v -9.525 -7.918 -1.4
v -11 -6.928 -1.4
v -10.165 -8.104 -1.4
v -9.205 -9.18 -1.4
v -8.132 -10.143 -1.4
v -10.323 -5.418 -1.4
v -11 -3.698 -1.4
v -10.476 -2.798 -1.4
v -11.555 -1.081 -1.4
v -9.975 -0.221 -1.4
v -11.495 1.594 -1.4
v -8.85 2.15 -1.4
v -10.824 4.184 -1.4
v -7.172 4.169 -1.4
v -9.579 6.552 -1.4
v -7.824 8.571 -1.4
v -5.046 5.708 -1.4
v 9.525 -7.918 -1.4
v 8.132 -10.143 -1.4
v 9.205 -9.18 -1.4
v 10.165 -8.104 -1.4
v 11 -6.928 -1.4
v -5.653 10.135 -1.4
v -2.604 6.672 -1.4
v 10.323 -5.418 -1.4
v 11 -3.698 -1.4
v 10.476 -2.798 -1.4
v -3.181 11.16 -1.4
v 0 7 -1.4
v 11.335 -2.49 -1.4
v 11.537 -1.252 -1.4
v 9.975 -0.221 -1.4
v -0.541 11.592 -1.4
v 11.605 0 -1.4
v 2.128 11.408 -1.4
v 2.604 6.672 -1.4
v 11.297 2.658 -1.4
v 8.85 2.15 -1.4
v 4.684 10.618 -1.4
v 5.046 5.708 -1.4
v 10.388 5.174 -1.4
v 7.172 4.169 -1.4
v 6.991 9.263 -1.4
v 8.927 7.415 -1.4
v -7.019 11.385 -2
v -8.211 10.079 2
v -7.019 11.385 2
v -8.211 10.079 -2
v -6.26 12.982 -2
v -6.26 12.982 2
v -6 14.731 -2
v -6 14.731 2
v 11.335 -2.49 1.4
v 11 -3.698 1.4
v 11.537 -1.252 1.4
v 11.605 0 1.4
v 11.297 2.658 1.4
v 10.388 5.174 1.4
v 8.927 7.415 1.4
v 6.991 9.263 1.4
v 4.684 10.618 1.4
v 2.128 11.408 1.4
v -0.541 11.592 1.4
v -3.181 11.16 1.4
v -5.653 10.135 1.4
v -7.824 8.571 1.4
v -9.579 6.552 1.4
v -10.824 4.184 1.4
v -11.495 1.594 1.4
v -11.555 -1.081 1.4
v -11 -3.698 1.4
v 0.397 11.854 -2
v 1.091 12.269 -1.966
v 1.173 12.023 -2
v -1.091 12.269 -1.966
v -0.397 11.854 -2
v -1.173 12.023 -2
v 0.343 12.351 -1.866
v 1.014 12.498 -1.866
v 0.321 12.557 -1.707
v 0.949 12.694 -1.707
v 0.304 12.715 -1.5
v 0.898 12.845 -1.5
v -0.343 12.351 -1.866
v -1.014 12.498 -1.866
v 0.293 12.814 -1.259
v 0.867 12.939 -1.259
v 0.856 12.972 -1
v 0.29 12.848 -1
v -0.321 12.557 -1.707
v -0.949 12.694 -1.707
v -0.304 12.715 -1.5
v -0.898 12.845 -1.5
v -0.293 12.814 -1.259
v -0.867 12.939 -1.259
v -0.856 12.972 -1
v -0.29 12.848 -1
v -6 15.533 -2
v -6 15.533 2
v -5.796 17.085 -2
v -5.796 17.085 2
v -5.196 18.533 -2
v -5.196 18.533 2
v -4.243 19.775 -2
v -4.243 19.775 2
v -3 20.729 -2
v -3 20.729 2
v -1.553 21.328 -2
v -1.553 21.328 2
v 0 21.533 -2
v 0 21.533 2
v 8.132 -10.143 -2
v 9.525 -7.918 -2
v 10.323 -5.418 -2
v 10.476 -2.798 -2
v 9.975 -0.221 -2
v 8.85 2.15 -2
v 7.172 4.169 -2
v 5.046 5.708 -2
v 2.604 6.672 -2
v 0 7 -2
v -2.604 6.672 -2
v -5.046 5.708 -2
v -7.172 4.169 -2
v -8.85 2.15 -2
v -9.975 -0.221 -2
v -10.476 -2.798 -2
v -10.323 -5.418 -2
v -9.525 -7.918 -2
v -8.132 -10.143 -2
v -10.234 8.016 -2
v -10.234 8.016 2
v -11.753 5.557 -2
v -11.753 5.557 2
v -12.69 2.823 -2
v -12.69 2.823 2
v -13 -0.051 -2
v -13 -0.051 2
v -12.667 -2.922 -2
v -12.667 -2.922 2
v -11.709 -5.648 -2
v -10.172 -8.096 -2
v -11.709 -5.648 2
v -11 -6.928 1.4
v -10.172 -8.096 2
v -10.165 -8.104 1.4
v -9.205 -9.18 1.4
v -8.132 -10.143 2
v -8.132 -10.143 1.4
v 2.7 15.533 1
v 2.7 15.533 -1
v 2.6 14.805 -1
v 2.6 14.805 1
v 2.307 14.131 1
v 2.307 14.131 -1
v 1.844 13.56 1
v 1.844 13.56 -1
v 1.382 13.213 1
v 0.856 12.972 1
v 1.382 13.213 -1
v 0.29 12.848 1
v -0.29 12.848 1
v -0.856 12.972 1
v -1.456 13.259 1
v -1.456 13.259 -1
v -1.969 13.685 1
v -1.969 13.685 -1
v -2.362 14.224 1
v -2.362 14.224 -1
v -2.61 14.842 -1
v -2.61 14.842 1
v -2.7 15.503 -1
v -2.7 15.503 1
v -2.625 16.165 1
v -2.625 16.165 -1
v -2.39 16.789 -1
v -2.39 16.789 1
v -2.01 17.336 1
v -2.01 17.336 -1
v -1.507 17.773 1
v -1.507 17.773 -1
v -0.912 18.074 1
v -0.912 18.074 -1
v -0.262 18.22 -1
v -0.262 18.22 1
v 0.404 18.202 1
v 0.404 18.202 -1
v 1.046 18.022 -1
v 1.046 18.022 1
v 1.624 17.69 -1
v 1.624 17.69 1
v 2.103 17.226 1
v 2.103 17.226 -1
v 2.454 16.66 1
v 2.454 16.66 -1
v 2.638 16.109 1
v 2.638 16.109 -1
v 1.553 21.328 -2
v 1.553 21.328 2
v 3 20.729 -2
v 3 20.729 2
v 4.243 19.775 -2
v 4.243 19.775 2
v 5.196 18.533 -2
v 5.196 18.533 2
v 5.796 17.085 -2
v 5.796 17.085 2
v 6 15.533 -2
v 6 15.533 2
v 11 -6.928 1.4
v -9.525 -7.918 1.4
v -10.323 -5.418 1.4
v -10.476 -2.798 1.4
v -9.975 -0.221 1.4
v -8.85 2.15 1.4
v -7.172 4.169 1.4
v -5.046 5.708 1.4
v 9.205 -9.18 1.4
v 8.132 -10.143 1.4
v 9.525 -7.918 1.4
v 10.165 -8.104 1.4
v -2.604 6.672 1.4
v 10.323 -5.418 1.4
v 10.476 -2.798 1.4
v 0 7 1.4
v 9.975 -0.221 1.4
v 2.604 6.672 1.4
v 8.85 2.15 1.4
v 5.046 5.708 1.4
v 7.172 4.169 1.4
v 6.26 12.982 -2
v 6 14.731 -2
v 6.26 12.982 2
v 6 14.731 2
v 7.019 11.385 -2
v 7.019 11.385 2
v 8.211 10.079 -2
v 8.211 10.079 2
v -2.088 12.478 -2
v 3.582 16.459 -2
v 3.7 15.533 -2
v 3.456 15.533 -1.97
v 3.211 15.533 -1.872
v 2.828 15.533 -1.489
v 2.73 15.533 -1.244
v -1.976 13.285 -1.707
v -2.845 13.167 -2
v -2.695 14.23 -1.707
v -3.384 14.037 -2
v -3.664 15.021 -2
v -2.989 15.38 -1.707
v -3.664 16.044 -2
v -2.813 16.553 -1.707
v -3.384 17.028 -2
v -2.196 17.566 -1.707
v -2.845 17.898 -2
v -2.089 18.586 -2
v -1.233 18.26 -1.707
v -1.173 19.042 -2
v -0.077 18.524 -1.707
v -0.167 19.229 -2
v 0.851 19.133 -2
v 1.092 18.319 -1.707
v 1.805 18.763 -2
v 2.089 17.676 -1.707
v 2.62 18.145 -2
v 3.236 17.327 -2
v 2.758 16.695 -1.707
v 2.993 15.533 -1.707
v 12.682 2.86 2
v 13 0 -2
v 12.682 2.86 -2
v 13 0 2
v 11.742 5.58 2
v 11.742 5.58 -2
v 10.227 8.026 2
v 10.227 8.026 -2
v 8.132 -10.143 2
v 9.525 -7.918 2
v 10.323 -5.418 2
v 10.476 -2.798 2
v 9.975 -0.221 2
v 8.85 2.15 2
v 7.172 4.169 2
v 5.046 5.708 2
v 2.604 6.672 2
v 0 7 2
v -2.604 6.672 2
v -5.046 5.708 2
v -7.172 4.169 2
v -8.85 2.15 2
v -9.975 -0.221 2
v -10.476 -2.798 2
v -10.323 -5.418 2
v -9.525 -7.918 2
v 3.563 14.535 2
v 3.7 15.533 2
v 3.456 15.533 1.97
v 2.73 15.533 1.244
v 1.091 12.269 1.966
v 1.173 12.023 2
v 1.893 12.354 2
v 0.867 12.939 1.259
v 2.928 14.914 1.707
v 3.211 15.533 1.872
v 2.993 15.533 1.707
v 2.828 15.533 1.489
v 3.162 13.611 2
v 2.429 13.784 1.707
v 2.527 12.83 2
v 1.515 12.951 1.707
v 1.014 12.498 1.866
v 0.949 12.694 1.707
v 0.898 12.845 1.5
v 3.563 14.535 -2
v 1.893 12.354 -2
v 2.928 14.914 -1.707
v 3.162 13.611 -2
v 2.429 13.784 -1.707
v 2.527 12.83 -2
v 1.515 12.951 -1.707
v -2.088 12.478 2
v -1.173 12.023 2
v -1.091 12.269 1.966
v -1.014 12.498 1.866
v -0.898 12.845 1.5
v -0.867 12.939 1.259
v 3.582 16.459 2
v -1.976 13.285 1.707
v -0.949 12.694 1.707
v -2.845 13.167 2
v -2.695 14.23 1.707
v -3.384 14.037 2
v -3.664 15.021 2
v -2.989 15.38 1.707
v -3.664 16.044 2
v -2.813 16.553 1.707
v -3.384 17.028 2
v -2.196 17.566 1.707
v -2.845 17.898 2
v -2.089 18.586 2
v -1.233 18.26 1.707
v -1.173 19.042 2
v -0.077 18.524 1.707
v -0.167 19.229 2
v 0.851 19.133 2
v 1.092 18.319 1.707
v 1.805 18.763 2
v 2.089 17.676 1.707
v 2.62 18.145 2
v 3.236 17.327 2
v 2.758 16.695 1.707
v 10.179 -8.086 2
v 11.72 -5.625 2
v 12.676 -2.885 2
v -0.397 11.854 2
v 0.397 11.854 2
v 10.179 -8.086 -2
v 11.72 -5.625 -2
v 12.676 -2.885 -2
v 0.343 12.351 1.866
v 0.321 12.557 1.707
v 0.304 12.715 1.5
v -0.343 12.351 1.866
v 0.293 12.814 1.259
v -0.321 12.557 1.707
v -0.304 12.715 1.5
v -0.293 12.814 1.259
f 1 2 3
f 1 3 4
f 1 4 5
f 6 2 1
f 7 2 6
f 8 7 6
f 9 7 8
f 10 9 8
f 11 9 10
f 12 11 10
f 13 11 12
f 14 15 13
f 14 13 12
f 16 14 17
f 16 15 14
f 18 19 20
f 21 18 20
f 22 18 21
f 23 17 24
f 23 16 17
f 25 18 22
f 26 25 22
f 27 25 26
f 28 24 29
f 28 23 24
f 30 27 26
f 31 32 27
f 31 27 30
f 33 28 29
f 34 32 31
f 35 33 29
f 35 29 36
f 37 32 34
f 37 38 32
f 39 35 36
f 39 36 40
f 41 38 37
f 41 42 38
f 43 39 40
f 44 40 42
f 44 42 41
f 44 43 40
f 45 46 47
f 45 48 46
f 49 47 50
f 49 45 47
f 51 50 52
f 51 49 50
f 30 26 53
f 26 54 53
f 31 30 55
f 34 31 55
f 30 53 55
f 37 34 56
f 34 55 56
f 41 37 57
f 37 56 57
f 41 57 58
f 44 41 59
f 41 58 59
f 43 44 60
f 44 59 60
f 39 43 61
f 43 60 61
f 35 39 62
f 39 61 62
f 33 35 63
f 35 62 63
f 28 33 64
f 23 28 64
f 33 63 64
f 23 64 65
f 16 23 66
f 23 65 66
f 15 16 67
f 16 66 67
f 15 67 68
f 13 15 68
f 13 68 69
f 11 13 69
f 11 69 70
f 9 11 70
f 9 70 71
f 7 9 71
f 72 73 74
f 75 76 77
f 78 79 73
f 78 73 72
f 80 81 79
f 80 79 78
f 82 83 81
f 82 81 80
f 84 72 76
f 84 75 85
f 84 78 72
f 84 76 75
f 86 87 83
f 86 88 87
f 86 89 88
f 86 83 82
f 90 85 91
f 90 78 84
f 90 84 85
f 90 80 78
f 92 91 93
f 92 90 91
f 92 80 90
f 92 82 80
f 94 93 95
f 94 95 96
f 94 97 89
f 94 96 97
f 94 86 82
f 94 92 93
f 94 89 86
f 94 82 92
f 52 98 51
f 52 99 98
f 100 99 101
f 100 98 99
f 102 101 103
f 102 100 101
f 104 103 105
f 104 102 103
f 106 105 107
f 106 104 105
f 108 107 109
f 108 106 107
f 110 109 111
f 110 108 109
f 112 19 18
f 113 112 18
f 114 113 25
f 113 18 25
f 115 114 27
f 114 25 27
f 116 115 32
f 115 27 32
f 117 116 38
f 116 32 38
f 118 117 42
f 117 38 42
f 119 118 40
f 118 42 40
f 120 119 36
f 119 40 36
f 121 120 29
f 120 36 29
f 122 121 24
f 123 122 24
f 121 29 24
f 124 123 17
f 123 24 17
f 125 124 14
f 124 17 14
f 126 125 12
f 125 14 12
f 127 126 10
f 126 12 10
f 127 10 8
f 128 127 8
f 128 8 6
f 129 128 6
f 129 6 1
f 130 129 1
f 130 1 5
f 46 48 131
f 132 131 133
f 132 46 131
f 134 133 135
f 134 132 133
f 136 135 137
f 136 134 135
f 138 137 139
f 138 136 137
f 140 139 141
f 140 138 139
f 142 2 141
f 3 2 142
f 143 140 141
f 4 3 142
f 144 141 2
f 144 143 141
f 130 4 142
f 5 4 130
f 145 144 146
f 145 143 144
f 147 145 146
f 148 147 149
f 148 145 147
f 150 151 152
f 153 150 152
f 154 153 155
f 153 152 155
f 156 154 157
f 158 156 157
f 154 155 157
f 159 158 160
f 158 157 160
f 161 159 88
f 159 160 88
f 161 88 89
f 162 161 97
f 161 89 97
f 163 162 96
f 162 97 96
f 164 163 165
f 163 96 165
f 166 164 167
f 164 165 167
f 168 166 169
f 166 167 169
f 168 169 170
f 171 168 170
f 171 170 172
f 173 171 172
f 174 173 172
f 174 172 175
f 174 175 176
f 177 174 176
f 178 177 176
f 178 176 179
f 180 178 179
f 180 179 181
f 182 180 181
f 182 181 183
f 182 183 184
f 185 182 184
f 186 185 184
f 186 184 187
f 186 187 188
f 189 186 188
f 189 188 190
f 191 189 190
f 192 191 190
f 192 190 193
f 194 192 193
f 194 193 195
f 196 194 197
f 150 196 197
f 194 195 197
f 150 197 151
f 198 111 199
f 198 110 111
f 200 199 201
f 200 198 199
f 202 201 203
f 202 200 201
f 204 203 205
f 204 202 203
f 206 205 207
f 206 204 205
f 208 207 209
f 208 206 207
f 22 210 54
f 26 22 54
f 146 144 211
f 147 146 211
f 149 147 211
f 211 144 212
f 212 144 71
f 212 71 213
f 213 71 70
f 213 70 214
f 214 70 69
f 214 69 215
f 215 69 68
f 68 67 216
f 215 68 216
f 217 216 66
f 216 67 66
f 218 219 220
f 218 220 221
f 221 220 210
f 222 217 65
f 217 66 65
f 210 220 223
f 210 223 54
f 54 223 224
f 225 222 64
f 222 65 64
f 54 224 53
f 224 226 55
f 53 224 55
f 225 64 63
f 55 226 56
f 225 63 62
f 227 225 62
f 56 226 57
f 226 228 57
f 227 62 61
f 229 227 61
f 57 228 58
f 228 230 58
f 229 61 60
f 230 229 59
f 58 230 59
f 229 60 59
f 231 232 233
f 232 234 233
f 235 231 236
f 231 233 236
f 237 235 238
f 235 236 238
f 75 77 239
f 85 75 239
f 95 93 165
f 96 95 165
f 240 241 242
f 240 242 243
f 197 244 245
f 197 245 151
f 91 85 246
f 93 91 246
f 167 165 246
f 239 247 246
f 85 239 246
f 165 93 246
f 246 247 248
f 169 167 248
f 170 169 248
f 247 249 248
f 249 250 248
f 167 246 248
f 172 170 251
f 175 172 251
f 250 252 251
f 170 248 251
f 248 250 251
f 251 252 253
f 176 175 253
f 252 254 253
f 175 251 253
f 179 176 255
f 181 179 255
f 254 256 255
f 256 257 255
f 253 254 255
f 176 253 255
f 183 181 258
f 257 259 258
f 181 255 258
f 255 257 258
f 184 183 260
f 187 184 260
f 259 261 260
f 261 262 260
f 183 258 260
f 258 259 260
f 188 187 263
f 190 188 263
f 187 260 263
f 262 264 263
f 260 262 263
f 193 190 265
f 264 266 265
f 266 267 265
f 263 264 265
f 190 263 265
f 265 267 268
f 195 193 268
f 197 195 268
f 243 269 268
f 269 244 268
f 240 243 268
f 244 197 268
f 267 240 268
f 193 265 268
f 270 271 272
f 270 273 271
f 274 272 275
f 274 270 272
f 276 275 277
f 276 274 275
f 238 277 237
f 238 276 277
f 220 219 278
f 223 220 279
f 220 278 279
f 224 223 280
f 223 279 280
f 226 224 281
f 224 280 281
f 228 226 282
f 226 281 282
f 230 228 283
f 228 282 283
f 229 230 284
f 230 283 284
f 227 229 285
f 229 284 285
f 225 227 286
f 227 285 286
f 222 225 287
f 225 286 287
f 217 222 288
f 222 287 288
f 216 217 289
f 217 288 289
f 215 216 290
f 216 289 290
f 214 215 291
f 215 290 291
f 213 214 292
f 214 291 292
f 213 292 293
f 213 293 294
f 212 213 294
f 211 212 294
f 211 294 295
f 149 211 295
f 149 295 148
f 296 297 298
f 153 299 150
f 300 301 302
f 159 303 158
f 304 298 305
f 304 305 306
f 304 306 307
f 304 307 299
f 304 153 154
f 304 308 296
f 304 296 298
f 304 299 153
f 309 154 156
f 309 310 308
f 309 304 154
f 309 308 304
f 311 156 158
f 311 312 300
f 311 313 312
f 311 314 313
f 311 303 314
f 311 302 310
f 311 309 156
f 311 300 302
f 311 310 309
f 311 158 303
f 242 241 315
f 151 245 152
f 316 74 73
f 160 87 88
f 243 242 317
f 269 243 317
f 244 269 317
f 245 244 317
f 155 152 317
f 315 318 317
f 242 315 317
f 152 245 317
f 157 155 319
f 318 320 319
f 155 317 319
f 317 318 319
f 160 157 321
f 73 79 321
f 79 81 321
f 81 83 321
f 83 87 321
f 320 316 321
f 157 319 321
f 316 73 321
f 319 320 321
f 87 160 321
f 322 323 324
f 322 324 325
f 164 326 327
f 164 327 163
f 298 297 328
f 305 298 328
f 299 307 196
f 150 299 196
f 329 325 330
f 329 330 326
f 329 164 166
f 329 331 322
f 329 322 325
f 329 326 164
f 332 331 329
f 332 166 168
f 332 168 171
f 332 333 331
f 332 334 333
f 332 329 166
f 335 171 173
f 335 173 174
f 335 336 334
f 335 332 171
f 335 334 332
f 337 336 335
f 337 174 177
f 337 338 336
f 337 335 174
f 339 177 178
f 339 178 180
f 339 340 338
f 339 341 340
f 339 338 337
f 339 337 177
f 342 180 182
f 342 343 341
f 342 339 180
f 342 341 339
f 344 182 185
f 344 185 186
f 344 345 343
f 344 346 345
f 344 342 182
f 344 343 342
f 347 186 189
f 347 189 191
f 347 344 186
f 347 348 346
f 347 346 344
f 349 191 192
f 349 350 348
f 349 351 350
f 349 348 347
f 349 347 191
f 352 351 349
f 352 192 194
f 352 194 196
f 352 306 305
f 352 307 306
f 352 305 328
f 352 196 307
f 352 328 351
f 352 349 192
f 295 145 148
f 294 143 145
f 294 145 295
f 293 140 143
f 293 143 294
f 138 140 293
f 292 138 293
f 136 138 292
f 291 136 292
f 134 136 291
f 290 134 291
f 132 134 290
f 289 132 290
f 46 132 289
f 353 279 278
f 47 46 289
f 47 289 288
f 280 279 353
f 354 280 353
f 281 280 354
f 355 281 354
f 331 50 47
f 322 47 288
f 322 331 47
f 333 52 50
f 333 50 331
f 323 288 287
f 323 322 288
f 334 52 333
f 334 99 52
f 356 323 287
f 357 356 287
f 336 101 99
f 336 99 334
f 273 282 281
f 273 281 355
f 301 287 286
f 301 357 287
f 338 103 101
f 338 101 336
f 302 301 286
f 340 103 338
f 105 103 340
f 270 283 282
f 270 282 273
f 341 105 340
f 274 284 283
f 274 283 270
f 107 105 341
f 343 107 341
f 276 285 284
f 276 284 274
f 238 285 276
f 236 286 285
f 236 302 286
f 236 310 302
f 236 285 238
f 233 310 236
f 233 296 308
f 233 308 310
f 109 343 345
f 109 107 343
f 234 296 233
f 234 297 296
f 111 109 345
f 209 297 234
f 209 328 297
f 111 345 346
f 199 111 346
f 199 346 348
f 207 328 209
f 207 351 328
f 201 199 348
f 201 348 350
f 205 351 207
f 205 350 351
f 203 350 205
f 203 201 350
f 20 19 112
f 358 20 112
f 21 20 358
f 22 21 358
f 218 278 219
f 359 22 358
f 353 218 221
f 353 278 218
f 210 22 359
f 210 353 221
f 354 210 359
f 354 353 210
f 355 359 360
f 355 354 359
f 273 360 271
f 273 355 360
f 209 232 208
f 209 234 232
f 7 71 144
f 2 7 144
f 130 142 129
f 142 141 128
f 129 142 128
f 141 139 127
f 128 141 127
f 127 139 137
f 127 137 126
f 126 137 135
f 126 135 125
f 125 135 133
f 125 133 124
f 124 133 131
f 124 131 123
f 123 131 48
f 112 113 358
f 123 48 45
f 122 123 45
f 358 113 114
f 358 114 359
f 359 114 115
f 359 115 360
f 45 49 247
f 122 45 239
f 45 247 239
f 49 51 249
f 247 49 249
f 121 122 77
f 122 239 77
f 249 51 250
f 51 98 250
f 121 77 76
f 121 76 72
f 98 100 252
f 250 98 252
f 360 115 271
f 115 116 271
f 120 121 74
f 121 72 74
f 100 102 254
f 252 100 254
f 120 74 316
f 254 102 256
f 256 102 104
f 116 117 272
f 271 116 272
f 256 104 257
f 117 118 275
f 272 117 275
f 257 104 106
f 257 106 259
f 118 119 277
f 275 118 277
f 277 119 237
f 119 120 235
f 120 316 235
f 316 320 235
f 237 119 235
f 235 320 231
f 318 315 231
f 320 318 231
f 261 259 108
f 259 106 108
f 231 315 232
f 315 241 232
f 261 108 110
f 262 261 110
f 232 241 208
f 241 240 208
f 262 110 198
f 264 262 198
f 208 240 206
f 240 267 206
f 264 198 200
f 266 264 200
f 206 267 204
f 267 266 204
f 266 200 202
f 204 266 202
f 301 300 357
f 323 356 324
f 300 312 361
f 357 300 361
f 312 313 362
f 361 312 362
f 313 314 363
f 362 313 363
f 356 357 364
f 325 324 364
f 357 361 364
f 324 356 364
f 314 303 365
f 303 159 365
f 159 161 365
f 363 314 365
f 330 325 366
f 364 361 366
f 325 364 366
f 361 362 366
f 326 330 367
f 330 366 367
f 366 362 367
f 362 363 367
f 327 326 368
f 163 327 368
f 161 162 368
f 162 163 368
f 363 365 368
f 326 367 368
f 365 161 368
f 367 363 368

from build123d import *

# Parameters (mm, degrees)
F1_DEPTH = 2
F2_R     = 5.99999
F3_R     = 1
F4_R     = 10.5
F5_DEPTH = 4.001
F7_DEPTH = 1.4


# Not quite as in the source:
# - a fillet or chamfer is up to 0.001 mm smaller than in the source, because OpenCascade refuses the exact size


with BuildPart() as f1:
    # F0 (on Top) → F1 (new body, symmetric)
    with BuildSketch(Plane.XY):
        with BuildLine():
            ThreePointArc((-6, 11.5325625947), (-6.7453687816, -11.1130553854), (13, 0))
            ThreePointArc((13, 0), (11.1130553854, 6.7453687816), (6, 11.5325625947))
            Line((6, 11.5325625947), (-6, 11.5325625947))
        make_face()
        with BuildLine():
            Line((-6, 11.5325625947), (6, 11.5325625947))
            ThreePointArc((6, 11.5325625947), (3.5026447844, 12.5192443667), (0.8558504936, 12.9717970973))
            ThreePointArc((0.8558504936, 12.9717970973), (0, 12.8325625947), (-0.8558504936, 12.9717970973))
            ThreePointArc((-0.8558504936, 12.9717970973), (-3.5026447844, 12.5192443667), (-6, 11.5325625947))
        make_face()
        with BuildLine():
            ThreePointArc((0.8558504936, 12.9717970973), (3.5026447844, 12.5192443667), (6, 11.5325625947))
            Line((6, 11.5325625947), (6, 21.5325625947))
            Line((6, 21.5325625947), (-6, 21.5325625947))
            Line((-6, 21.5325625947), (-6, 11.5325625947))
            ThreePointArc((-6, 11.5325625947), (-3.5026447844, 12.5192443667), (-0.8558504936, 12.9717970973))
            ThreePointArc((-0.8558504936, 12.9717970973), (-1.5778472149, 17.7235436914), (2.7, 15.5325625947))
            ThreePointArc((2.7, 15.5325625947), (2.1909810967, 13.9547153797), (0.8558504936, 12.9717970973))
        make_face()
    extrude(amount=F1_DEPTH, both=True)

    # F2 (radius 6 in the source; OpenCascade refuses exactly that, so slightly less here)
    f2_edges = [f1.edges().sort_by_distance(p)[0] for p in [
        (-6, 21.532563, 0),
        (6, 21.532563, 0),
        (6, 11.532563, 0),
        (-6, 11.532563, 0),
    ]]
    fillet(f2_edges, radius=F2_R)

    # F3
    f3_edges = [f1.edges().sort_by_distance(p)[0] for p in [
        (0.85585, 18.093328, 2),
        (0.85585, 18.093328, -2),
    ]]
    fillet(f3_edges, radius=F3_R)

    # F4 (on face) → F5 (cut, through all)
    with BuildSketch(Plane.XY.offset(2)):
        with Locations((0, -3.5)):
            Circle(F4_R)
    extrude(amount=-F5_DEPTH, mode=Mode.SUBTRACT)

    # F6 (on Top) → F7 (cut, symmetric)
    with BuildSketch(Plane.XY):
        with BuildLine():
            ThreePointArc((11, -3.6981110043), (11.452751307, -1.8736361707), (11.605, 0))
            ThreePointArc((11.605, 0), (-1.8736361707, 11.452751307), (-11, -3.6981110043))
            Line((-11, -3.6981110043), (11, -3.6981110043))
        make_face()
        with BuildLine():
            Line((11, -3.6981110043), (-11, -3.6981110043))
            ThreePointArc((-11, -3.6981110043), (0, -11.605), (11, -3.6981110043))
        make_face()
        with BuildLine():
            ThreePointArc((11, -3.6981110043), (0, -11.605), (-11, -3.6981110043))
            Line((-11, -3.6981110043), (-11, -14.1476519146))
            Line((-11, -14.1476519146), (11, -14.1476519146))
            Line((11, -14.1476519146), (11, -3.6981110043))
        make_face()
    extrude(amount=F7_DEPTH, both=True, mode=Mode.SUBTRACT)


solid = f1.part
